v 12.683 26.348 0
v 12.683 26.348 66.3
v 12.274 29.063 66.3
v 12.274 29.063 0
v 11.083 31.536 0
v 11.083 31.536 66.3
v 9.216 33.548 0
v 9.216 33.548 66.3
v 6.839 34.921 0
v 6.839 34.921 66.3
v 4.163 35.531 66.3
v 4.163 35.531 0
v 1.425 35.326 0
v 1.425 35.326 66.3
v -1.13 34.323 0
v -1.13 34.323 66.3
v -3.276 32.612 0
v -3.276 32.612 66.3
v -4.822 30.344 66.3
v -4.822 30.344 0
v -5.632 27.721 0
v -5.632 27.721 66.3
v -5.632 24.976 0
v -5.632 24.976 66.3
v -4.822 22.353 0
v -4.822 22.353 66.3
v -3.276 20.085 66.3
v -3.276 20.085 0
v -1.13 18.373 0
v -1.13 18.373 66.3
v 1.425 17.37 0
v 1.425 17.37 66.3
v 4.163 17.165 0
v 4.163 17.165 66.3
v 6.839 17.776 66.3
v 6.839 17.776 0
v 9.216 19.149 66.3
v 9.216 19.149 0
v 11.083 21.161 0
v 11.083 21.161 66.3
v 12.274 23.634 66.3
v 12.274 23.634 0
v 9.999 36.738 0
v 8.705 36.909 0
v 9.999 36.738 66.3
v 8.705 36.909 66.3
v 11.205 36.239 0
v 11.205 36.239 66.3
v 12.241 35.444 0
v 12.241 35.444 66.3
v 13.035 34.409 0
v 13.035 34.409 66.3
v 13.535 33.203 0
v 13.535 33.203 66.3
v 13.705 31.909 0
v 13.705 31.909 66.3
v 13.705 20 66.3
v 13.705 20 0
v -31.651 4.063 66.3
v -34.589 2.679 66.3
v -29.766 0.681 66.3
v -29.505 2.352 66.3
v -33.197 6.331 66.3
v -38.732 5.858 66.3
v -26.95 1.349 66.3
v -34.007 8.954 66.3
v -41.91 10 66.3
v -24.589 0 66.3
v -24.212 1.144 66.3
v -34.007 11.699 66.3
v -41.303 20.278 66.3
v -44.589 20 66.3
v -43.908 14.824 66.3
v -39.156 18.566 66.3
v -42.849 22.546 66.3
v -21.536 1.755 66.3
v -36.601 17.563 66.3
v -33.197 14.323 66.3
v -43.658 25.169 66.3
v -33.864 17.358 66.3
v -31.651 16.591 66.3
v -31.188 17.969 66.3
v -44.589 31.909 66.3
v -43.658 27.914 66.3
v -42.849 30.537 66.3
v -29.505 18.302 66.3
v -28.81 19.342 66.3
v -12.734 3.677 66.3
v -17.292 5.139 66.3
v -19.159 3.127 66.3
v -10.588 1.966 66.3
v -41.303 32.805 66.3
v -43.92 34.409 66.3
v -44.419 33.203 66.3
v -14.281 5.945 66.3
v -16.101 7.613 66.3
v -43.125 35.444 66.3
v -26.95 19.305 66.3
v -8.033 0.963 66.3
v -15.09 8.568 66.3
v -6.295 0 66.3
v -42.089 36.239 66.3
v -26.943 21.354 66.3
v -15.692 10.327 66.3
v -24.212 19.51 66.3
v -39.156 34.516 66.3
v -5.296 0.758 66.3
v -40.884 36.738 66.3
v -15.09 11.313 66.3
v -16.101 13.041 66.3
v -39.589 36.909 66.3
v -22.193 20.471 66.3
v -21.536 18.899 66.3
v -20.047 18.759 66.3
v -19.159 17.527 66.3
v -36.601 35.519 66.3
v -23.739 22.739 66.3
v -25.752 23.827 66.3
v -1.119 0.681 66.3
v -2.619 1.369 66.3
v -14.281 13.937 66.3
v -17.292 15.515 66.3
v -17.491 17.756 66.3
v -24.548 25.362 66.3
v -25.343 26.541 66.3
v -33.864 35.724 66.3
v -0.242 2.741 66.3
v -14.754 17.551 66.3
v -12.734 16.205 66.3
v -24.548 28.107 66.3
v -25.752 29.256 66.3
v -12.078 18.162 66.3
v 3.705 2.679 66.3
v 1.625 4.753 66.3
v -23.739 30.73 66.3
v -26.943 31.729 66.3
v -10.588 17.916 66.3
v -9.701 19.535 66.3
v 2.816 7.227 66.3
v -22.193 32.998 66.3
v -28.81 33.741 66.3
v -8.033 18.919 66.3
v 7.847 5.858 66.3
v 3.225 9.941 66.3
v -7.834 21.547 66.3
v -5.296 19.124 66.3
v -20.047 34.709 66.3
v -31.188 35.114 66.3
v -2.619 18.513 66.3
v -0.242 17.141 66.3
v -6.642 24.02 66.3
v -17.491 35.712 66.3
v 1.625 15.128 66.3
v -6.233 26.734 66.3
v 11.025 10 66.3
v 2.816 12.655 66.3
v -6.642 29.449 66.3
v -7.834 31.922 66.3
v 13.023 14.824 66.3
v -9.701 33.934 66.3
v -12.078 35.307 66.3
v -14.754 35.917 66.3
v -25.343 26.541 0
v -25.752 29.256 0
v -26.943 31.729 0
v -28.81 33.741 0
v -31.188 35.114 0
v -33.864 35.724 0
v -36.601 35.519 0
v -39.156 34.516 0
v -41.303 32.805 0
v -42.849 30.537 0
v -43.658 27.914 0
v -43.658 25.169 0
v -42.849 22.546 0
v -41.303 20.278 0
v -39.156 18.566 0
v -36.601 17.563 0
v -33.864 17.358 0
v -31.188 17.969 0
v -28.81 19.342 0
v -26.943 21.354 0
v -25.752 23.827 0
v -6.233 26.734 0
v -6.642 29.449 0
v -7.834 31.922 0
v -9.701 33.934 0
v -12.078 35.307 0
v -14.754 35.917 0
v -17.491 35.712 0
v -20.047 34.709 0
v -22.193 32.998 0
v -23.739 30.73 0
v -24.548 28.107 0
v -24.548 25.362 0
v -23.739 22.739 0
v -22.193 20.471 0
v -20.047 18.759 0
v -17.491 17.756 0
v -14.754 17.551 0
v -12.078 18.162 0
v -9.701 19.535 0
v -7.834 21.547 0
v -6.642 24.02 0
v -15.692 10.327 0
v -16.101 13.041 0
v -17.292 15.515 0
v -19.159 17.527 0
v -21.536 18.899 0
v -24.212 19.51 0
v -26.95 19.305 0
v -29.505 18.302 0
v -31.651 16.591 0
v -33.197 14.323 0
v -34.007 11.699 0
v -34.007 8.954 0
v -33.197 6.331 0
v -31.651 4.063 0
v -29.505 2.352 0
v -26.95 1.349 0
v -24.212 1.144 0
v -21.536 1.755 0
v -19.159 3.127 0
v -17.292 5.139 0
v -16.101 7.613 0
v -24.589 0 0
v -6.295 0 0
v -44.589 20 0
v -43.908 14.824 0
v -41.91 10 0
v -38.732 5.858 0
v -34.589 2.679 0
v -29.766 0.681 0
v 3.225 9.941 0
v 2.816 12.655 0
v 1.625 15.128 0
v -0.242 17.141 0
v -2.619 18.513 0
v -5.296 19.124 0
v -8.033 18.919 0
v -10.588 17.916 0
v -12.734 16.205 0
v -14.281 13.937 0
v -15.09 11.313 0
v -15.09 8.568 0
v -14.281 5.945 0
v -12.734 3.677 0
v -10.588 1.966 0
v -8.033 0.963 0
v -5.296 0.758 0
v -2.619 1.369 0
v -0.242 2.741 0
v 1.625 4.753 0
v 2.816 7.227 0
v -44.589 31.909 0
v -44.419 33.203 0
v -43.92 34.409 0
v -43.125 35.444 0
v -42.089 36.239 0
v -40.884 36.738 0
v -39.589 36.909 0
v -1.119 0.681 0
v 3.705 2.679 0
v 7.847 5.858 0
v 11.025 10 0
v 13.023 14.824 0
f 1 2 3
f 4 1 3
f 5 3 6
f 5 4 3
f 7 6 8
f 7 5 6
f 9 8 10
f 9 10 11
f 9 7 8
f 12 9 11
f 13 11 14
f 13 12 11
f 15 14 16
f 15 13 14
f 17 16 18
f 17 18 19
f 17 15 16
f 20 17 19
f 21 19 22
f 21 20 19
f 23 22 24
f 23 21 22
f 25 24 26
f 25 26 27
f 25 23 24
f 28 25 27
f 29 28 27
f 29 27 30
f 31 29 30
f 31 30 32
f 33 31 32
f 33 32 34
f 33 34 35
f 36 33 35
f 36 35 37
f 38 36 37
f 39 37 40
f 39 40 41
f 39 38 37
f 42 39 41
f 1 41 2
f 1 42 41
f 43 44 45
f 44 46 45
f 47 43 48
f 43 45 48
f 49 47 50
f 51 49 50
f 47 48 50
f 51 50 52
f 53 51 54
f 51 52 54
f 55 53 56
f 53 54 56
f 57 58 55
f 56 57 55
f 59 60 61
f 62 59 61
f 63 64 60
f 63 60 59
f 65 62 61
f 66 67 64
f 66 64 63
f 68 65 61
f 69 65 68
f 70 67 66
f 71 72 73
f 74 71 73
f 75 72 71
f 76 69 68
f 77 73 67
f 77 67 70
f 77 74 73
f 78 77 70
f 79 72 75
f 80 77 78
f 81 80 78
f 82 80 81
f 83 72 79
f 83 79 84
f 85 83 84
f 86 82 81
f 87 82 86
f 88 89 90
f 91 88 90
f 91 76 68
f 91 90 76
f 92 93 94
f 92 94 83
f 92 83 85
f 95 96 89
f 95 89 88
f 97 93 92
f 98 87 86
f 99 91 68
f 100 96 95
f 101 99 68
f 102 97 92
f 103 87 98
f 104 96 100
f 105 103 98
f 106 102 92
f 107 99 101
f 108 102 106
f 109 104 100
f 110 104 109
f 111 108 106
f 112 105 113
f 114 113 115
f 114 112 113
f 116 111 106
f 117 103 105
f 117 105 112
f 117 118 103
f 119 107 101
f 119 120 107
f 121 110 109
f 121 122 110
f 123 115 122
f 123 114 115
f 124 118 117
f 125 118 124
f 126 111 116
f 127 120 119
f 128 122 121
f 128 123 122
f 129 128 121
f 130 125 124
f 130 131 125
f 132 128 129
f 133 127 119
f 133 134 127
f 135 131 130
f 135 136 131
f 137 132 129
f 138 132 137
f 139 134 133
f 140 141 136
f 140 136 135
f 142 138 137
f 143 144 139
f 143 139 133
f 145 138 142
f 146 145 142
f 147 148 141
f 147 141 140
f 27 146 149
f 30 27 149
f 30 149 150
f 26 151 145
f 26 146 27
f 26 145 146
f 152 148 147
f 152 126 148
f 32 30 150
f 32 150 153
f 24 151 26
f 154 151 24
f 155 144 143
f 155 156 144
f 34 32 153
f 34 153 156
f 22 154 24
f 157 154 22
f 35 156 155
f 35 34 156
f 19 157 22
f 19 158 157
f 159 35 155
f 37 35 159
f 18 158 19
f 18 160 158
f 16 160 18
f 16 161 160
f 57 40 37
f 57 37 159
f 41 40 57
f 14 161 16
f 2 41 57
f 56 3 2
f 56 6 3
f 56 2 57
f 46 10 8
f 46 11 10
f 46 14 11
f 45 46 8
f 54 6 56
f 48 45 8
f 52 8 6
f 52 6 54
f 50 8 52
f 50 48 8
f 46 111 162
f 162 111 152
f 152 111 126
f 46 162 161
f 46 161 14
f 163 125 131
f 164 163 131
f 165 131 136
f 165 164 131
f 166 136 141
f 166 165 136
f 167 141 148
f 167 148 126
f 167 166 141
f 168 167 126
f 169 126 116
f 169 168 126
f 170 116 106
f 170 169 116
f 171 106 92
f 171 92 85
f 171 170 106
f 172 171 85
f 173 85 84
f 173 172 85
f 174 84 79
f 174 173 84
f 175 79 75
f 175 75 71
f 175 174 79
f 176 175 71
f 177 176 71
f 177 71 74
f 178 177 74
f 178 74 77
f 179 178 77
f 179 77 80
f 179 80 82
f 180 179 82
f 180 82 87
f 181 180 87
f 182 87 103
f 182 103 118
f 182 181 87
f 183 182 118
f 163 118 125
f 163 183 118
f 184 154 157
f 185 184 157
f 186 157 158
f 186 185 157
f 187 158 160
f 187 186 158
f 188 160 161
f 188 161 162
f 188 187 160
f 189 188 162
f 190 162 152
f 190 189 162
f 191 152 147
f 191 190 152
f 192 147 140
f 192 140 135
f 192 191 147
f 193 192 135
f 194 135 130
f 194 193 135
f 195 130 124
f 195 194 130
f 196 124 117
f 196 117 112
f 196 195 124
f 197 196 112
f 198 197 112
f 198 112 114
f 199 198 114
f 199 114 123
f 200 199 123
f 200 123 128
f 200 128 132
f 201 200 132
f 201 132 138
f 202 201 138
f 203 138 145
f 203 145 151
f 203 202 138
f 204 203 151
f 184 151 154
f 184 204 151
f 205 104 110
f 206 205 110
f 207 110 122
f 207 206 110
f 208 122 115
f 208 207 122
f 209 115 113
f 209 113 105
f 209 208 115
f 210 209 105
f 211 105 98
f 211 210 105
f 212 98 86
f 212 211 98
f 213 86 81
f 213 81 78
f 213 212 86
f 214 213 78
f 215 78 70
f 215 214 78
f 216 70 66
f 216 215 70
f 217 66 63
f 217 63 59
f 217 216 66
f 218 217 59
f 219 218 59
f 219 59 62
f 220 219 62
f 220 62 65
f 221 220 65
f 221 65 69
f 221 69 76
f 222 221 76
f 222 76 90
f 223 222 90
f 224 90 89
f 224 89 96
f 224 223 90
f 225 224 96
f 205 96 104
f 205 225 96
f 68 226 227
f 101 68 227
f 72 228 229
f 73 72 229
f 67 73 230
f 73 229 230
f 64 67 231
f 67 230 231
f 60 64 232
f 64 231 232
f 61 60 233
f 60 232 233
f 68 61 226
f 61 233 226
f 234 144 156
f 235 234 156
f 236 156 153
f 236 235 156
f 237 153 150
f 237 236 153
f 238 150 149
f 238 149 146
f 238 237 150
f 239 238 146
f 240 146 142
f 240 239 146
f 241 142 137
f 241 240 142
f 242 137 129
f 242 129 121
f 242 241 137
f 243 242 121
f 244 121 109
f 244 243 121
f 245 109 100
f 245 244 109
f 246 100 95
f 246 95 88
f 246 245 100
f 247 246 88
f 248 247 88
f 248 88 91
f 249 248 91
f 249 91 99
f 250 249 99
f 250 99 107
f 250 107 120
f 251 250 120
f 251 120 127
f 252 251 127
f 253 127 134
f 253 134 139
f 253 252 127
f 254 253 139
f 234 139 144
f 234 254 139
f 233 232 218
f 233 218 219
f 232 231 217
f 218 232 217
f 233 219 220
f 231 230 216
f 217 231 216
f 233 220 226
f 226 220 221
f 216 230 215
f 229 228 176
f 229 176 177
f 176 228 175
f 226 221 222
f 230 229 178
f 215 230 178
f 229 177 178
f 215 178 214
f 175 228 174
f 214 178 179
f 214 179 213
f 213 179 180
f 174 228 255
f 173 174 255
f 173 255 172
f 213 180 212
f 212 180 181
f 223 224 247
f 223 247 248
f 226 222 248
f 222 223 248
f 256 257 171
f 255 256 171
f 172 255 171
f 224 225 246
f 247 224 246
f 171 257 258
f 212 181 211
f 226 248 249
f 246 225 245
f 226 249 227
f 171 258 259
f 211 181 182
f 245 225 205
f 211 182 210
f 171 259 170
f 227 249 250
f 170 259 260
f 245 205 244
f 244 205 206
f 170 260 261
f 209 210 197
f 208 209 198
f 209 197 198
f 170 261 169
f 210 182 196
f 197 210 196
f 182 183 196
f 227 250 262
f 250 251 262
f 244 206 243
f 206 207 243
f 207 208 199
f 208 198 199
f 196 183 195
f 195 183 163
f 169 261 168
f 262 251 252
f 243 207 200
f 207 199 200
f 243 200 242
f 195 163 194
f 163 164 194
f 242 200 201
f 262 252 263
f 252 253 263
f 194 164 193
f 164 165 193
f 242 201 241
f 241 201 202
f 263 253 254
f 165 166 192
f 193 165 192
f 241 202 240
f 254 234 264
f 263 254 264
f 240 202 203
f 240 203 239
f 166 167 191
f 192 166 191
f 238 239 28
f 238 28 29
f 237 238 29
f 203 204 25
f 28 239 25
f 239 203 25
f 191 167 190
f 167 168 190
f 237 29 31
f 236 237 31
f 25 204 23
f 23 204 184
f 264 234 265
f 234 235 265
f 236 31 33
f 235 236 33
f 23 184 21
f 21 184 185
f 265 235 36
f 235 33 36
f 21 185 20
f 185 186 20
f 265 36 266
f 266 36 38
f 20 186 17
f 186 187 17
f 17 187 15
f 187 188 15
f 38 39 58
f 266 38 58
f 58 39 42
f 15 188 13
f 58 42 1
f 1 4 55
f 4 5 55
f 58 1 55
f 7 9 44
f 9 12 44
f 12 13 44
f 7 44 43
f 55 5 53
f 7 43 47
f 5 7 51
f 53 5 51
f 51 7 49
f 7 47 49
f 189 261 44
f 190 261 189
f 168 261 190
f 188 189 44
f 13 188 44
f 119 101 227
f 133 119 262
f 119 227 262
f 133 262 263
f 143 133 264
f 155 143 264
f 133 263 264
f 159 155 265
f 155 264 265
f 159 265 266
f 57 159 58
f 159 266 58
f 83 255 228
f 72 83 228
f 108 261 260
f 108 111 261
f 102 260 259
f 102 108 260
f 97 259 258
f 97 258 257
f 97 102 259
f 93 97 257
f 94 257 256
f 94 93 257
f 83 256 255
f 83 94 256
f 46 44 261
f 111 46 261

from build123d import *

# Parameters (mm, degrees)
F0_R     = 9.20886
F1_DEPTH = 66.3
F2_R     = 5


with BuildPart() as f1:
    # F0 (on Top) → F1 (new body)
    with BuildSketch(Plane.XY):
        with BuildLine():
            Line((13.70497, 36.908648), (-44.589408, 36.908648))
            Line((-44.589408, 36.908648), (-44.589408, 20))
            ThreePointArc((-44.589408, 20), (-38.731543, 5.857864), (-24.589408, 0))
            Line((-24.589408, 0), (-6.29503, 0))
            ThreePointArc((-6.29503, 0), (7.847106, 5.857864), (13.70497, 20))
            Line((13.70497, 20), (13.70497, 36.908648))
        make_face()
        with Locations((-24.90058, 10.326985)):
            Circle(F0_R, mode=Mode.SUBTRACT)
        with Locations((-5.98386, 9.940929)):
            Circle(F0_R, mode=Mode.SUBTRACT)
        with Locations((-34.551967, 26.541315)):
            Circle(F0_R, mode=Mode.SUBTRACT)
        with Locations((-15.442219, 26.734345)):
            Circle(F0_R, mode=Mode.SUBTRACT)
        with Locations((3.474499, 26.348287)):
            Circle(F0_R, mode=Mode.SUBTRACT)
    extrude(amount=F1_DEPTH)

    # F2
    f2_edges = [f1.edges().sort_by_distance(p)[0] for p in [
        (13.70497, 36.908648, 33.15),
        (-44.589408, 36.908648, 33.15),
    ]]
    fillet(f2_edges, radius=F2_R)


solid = f1.part
